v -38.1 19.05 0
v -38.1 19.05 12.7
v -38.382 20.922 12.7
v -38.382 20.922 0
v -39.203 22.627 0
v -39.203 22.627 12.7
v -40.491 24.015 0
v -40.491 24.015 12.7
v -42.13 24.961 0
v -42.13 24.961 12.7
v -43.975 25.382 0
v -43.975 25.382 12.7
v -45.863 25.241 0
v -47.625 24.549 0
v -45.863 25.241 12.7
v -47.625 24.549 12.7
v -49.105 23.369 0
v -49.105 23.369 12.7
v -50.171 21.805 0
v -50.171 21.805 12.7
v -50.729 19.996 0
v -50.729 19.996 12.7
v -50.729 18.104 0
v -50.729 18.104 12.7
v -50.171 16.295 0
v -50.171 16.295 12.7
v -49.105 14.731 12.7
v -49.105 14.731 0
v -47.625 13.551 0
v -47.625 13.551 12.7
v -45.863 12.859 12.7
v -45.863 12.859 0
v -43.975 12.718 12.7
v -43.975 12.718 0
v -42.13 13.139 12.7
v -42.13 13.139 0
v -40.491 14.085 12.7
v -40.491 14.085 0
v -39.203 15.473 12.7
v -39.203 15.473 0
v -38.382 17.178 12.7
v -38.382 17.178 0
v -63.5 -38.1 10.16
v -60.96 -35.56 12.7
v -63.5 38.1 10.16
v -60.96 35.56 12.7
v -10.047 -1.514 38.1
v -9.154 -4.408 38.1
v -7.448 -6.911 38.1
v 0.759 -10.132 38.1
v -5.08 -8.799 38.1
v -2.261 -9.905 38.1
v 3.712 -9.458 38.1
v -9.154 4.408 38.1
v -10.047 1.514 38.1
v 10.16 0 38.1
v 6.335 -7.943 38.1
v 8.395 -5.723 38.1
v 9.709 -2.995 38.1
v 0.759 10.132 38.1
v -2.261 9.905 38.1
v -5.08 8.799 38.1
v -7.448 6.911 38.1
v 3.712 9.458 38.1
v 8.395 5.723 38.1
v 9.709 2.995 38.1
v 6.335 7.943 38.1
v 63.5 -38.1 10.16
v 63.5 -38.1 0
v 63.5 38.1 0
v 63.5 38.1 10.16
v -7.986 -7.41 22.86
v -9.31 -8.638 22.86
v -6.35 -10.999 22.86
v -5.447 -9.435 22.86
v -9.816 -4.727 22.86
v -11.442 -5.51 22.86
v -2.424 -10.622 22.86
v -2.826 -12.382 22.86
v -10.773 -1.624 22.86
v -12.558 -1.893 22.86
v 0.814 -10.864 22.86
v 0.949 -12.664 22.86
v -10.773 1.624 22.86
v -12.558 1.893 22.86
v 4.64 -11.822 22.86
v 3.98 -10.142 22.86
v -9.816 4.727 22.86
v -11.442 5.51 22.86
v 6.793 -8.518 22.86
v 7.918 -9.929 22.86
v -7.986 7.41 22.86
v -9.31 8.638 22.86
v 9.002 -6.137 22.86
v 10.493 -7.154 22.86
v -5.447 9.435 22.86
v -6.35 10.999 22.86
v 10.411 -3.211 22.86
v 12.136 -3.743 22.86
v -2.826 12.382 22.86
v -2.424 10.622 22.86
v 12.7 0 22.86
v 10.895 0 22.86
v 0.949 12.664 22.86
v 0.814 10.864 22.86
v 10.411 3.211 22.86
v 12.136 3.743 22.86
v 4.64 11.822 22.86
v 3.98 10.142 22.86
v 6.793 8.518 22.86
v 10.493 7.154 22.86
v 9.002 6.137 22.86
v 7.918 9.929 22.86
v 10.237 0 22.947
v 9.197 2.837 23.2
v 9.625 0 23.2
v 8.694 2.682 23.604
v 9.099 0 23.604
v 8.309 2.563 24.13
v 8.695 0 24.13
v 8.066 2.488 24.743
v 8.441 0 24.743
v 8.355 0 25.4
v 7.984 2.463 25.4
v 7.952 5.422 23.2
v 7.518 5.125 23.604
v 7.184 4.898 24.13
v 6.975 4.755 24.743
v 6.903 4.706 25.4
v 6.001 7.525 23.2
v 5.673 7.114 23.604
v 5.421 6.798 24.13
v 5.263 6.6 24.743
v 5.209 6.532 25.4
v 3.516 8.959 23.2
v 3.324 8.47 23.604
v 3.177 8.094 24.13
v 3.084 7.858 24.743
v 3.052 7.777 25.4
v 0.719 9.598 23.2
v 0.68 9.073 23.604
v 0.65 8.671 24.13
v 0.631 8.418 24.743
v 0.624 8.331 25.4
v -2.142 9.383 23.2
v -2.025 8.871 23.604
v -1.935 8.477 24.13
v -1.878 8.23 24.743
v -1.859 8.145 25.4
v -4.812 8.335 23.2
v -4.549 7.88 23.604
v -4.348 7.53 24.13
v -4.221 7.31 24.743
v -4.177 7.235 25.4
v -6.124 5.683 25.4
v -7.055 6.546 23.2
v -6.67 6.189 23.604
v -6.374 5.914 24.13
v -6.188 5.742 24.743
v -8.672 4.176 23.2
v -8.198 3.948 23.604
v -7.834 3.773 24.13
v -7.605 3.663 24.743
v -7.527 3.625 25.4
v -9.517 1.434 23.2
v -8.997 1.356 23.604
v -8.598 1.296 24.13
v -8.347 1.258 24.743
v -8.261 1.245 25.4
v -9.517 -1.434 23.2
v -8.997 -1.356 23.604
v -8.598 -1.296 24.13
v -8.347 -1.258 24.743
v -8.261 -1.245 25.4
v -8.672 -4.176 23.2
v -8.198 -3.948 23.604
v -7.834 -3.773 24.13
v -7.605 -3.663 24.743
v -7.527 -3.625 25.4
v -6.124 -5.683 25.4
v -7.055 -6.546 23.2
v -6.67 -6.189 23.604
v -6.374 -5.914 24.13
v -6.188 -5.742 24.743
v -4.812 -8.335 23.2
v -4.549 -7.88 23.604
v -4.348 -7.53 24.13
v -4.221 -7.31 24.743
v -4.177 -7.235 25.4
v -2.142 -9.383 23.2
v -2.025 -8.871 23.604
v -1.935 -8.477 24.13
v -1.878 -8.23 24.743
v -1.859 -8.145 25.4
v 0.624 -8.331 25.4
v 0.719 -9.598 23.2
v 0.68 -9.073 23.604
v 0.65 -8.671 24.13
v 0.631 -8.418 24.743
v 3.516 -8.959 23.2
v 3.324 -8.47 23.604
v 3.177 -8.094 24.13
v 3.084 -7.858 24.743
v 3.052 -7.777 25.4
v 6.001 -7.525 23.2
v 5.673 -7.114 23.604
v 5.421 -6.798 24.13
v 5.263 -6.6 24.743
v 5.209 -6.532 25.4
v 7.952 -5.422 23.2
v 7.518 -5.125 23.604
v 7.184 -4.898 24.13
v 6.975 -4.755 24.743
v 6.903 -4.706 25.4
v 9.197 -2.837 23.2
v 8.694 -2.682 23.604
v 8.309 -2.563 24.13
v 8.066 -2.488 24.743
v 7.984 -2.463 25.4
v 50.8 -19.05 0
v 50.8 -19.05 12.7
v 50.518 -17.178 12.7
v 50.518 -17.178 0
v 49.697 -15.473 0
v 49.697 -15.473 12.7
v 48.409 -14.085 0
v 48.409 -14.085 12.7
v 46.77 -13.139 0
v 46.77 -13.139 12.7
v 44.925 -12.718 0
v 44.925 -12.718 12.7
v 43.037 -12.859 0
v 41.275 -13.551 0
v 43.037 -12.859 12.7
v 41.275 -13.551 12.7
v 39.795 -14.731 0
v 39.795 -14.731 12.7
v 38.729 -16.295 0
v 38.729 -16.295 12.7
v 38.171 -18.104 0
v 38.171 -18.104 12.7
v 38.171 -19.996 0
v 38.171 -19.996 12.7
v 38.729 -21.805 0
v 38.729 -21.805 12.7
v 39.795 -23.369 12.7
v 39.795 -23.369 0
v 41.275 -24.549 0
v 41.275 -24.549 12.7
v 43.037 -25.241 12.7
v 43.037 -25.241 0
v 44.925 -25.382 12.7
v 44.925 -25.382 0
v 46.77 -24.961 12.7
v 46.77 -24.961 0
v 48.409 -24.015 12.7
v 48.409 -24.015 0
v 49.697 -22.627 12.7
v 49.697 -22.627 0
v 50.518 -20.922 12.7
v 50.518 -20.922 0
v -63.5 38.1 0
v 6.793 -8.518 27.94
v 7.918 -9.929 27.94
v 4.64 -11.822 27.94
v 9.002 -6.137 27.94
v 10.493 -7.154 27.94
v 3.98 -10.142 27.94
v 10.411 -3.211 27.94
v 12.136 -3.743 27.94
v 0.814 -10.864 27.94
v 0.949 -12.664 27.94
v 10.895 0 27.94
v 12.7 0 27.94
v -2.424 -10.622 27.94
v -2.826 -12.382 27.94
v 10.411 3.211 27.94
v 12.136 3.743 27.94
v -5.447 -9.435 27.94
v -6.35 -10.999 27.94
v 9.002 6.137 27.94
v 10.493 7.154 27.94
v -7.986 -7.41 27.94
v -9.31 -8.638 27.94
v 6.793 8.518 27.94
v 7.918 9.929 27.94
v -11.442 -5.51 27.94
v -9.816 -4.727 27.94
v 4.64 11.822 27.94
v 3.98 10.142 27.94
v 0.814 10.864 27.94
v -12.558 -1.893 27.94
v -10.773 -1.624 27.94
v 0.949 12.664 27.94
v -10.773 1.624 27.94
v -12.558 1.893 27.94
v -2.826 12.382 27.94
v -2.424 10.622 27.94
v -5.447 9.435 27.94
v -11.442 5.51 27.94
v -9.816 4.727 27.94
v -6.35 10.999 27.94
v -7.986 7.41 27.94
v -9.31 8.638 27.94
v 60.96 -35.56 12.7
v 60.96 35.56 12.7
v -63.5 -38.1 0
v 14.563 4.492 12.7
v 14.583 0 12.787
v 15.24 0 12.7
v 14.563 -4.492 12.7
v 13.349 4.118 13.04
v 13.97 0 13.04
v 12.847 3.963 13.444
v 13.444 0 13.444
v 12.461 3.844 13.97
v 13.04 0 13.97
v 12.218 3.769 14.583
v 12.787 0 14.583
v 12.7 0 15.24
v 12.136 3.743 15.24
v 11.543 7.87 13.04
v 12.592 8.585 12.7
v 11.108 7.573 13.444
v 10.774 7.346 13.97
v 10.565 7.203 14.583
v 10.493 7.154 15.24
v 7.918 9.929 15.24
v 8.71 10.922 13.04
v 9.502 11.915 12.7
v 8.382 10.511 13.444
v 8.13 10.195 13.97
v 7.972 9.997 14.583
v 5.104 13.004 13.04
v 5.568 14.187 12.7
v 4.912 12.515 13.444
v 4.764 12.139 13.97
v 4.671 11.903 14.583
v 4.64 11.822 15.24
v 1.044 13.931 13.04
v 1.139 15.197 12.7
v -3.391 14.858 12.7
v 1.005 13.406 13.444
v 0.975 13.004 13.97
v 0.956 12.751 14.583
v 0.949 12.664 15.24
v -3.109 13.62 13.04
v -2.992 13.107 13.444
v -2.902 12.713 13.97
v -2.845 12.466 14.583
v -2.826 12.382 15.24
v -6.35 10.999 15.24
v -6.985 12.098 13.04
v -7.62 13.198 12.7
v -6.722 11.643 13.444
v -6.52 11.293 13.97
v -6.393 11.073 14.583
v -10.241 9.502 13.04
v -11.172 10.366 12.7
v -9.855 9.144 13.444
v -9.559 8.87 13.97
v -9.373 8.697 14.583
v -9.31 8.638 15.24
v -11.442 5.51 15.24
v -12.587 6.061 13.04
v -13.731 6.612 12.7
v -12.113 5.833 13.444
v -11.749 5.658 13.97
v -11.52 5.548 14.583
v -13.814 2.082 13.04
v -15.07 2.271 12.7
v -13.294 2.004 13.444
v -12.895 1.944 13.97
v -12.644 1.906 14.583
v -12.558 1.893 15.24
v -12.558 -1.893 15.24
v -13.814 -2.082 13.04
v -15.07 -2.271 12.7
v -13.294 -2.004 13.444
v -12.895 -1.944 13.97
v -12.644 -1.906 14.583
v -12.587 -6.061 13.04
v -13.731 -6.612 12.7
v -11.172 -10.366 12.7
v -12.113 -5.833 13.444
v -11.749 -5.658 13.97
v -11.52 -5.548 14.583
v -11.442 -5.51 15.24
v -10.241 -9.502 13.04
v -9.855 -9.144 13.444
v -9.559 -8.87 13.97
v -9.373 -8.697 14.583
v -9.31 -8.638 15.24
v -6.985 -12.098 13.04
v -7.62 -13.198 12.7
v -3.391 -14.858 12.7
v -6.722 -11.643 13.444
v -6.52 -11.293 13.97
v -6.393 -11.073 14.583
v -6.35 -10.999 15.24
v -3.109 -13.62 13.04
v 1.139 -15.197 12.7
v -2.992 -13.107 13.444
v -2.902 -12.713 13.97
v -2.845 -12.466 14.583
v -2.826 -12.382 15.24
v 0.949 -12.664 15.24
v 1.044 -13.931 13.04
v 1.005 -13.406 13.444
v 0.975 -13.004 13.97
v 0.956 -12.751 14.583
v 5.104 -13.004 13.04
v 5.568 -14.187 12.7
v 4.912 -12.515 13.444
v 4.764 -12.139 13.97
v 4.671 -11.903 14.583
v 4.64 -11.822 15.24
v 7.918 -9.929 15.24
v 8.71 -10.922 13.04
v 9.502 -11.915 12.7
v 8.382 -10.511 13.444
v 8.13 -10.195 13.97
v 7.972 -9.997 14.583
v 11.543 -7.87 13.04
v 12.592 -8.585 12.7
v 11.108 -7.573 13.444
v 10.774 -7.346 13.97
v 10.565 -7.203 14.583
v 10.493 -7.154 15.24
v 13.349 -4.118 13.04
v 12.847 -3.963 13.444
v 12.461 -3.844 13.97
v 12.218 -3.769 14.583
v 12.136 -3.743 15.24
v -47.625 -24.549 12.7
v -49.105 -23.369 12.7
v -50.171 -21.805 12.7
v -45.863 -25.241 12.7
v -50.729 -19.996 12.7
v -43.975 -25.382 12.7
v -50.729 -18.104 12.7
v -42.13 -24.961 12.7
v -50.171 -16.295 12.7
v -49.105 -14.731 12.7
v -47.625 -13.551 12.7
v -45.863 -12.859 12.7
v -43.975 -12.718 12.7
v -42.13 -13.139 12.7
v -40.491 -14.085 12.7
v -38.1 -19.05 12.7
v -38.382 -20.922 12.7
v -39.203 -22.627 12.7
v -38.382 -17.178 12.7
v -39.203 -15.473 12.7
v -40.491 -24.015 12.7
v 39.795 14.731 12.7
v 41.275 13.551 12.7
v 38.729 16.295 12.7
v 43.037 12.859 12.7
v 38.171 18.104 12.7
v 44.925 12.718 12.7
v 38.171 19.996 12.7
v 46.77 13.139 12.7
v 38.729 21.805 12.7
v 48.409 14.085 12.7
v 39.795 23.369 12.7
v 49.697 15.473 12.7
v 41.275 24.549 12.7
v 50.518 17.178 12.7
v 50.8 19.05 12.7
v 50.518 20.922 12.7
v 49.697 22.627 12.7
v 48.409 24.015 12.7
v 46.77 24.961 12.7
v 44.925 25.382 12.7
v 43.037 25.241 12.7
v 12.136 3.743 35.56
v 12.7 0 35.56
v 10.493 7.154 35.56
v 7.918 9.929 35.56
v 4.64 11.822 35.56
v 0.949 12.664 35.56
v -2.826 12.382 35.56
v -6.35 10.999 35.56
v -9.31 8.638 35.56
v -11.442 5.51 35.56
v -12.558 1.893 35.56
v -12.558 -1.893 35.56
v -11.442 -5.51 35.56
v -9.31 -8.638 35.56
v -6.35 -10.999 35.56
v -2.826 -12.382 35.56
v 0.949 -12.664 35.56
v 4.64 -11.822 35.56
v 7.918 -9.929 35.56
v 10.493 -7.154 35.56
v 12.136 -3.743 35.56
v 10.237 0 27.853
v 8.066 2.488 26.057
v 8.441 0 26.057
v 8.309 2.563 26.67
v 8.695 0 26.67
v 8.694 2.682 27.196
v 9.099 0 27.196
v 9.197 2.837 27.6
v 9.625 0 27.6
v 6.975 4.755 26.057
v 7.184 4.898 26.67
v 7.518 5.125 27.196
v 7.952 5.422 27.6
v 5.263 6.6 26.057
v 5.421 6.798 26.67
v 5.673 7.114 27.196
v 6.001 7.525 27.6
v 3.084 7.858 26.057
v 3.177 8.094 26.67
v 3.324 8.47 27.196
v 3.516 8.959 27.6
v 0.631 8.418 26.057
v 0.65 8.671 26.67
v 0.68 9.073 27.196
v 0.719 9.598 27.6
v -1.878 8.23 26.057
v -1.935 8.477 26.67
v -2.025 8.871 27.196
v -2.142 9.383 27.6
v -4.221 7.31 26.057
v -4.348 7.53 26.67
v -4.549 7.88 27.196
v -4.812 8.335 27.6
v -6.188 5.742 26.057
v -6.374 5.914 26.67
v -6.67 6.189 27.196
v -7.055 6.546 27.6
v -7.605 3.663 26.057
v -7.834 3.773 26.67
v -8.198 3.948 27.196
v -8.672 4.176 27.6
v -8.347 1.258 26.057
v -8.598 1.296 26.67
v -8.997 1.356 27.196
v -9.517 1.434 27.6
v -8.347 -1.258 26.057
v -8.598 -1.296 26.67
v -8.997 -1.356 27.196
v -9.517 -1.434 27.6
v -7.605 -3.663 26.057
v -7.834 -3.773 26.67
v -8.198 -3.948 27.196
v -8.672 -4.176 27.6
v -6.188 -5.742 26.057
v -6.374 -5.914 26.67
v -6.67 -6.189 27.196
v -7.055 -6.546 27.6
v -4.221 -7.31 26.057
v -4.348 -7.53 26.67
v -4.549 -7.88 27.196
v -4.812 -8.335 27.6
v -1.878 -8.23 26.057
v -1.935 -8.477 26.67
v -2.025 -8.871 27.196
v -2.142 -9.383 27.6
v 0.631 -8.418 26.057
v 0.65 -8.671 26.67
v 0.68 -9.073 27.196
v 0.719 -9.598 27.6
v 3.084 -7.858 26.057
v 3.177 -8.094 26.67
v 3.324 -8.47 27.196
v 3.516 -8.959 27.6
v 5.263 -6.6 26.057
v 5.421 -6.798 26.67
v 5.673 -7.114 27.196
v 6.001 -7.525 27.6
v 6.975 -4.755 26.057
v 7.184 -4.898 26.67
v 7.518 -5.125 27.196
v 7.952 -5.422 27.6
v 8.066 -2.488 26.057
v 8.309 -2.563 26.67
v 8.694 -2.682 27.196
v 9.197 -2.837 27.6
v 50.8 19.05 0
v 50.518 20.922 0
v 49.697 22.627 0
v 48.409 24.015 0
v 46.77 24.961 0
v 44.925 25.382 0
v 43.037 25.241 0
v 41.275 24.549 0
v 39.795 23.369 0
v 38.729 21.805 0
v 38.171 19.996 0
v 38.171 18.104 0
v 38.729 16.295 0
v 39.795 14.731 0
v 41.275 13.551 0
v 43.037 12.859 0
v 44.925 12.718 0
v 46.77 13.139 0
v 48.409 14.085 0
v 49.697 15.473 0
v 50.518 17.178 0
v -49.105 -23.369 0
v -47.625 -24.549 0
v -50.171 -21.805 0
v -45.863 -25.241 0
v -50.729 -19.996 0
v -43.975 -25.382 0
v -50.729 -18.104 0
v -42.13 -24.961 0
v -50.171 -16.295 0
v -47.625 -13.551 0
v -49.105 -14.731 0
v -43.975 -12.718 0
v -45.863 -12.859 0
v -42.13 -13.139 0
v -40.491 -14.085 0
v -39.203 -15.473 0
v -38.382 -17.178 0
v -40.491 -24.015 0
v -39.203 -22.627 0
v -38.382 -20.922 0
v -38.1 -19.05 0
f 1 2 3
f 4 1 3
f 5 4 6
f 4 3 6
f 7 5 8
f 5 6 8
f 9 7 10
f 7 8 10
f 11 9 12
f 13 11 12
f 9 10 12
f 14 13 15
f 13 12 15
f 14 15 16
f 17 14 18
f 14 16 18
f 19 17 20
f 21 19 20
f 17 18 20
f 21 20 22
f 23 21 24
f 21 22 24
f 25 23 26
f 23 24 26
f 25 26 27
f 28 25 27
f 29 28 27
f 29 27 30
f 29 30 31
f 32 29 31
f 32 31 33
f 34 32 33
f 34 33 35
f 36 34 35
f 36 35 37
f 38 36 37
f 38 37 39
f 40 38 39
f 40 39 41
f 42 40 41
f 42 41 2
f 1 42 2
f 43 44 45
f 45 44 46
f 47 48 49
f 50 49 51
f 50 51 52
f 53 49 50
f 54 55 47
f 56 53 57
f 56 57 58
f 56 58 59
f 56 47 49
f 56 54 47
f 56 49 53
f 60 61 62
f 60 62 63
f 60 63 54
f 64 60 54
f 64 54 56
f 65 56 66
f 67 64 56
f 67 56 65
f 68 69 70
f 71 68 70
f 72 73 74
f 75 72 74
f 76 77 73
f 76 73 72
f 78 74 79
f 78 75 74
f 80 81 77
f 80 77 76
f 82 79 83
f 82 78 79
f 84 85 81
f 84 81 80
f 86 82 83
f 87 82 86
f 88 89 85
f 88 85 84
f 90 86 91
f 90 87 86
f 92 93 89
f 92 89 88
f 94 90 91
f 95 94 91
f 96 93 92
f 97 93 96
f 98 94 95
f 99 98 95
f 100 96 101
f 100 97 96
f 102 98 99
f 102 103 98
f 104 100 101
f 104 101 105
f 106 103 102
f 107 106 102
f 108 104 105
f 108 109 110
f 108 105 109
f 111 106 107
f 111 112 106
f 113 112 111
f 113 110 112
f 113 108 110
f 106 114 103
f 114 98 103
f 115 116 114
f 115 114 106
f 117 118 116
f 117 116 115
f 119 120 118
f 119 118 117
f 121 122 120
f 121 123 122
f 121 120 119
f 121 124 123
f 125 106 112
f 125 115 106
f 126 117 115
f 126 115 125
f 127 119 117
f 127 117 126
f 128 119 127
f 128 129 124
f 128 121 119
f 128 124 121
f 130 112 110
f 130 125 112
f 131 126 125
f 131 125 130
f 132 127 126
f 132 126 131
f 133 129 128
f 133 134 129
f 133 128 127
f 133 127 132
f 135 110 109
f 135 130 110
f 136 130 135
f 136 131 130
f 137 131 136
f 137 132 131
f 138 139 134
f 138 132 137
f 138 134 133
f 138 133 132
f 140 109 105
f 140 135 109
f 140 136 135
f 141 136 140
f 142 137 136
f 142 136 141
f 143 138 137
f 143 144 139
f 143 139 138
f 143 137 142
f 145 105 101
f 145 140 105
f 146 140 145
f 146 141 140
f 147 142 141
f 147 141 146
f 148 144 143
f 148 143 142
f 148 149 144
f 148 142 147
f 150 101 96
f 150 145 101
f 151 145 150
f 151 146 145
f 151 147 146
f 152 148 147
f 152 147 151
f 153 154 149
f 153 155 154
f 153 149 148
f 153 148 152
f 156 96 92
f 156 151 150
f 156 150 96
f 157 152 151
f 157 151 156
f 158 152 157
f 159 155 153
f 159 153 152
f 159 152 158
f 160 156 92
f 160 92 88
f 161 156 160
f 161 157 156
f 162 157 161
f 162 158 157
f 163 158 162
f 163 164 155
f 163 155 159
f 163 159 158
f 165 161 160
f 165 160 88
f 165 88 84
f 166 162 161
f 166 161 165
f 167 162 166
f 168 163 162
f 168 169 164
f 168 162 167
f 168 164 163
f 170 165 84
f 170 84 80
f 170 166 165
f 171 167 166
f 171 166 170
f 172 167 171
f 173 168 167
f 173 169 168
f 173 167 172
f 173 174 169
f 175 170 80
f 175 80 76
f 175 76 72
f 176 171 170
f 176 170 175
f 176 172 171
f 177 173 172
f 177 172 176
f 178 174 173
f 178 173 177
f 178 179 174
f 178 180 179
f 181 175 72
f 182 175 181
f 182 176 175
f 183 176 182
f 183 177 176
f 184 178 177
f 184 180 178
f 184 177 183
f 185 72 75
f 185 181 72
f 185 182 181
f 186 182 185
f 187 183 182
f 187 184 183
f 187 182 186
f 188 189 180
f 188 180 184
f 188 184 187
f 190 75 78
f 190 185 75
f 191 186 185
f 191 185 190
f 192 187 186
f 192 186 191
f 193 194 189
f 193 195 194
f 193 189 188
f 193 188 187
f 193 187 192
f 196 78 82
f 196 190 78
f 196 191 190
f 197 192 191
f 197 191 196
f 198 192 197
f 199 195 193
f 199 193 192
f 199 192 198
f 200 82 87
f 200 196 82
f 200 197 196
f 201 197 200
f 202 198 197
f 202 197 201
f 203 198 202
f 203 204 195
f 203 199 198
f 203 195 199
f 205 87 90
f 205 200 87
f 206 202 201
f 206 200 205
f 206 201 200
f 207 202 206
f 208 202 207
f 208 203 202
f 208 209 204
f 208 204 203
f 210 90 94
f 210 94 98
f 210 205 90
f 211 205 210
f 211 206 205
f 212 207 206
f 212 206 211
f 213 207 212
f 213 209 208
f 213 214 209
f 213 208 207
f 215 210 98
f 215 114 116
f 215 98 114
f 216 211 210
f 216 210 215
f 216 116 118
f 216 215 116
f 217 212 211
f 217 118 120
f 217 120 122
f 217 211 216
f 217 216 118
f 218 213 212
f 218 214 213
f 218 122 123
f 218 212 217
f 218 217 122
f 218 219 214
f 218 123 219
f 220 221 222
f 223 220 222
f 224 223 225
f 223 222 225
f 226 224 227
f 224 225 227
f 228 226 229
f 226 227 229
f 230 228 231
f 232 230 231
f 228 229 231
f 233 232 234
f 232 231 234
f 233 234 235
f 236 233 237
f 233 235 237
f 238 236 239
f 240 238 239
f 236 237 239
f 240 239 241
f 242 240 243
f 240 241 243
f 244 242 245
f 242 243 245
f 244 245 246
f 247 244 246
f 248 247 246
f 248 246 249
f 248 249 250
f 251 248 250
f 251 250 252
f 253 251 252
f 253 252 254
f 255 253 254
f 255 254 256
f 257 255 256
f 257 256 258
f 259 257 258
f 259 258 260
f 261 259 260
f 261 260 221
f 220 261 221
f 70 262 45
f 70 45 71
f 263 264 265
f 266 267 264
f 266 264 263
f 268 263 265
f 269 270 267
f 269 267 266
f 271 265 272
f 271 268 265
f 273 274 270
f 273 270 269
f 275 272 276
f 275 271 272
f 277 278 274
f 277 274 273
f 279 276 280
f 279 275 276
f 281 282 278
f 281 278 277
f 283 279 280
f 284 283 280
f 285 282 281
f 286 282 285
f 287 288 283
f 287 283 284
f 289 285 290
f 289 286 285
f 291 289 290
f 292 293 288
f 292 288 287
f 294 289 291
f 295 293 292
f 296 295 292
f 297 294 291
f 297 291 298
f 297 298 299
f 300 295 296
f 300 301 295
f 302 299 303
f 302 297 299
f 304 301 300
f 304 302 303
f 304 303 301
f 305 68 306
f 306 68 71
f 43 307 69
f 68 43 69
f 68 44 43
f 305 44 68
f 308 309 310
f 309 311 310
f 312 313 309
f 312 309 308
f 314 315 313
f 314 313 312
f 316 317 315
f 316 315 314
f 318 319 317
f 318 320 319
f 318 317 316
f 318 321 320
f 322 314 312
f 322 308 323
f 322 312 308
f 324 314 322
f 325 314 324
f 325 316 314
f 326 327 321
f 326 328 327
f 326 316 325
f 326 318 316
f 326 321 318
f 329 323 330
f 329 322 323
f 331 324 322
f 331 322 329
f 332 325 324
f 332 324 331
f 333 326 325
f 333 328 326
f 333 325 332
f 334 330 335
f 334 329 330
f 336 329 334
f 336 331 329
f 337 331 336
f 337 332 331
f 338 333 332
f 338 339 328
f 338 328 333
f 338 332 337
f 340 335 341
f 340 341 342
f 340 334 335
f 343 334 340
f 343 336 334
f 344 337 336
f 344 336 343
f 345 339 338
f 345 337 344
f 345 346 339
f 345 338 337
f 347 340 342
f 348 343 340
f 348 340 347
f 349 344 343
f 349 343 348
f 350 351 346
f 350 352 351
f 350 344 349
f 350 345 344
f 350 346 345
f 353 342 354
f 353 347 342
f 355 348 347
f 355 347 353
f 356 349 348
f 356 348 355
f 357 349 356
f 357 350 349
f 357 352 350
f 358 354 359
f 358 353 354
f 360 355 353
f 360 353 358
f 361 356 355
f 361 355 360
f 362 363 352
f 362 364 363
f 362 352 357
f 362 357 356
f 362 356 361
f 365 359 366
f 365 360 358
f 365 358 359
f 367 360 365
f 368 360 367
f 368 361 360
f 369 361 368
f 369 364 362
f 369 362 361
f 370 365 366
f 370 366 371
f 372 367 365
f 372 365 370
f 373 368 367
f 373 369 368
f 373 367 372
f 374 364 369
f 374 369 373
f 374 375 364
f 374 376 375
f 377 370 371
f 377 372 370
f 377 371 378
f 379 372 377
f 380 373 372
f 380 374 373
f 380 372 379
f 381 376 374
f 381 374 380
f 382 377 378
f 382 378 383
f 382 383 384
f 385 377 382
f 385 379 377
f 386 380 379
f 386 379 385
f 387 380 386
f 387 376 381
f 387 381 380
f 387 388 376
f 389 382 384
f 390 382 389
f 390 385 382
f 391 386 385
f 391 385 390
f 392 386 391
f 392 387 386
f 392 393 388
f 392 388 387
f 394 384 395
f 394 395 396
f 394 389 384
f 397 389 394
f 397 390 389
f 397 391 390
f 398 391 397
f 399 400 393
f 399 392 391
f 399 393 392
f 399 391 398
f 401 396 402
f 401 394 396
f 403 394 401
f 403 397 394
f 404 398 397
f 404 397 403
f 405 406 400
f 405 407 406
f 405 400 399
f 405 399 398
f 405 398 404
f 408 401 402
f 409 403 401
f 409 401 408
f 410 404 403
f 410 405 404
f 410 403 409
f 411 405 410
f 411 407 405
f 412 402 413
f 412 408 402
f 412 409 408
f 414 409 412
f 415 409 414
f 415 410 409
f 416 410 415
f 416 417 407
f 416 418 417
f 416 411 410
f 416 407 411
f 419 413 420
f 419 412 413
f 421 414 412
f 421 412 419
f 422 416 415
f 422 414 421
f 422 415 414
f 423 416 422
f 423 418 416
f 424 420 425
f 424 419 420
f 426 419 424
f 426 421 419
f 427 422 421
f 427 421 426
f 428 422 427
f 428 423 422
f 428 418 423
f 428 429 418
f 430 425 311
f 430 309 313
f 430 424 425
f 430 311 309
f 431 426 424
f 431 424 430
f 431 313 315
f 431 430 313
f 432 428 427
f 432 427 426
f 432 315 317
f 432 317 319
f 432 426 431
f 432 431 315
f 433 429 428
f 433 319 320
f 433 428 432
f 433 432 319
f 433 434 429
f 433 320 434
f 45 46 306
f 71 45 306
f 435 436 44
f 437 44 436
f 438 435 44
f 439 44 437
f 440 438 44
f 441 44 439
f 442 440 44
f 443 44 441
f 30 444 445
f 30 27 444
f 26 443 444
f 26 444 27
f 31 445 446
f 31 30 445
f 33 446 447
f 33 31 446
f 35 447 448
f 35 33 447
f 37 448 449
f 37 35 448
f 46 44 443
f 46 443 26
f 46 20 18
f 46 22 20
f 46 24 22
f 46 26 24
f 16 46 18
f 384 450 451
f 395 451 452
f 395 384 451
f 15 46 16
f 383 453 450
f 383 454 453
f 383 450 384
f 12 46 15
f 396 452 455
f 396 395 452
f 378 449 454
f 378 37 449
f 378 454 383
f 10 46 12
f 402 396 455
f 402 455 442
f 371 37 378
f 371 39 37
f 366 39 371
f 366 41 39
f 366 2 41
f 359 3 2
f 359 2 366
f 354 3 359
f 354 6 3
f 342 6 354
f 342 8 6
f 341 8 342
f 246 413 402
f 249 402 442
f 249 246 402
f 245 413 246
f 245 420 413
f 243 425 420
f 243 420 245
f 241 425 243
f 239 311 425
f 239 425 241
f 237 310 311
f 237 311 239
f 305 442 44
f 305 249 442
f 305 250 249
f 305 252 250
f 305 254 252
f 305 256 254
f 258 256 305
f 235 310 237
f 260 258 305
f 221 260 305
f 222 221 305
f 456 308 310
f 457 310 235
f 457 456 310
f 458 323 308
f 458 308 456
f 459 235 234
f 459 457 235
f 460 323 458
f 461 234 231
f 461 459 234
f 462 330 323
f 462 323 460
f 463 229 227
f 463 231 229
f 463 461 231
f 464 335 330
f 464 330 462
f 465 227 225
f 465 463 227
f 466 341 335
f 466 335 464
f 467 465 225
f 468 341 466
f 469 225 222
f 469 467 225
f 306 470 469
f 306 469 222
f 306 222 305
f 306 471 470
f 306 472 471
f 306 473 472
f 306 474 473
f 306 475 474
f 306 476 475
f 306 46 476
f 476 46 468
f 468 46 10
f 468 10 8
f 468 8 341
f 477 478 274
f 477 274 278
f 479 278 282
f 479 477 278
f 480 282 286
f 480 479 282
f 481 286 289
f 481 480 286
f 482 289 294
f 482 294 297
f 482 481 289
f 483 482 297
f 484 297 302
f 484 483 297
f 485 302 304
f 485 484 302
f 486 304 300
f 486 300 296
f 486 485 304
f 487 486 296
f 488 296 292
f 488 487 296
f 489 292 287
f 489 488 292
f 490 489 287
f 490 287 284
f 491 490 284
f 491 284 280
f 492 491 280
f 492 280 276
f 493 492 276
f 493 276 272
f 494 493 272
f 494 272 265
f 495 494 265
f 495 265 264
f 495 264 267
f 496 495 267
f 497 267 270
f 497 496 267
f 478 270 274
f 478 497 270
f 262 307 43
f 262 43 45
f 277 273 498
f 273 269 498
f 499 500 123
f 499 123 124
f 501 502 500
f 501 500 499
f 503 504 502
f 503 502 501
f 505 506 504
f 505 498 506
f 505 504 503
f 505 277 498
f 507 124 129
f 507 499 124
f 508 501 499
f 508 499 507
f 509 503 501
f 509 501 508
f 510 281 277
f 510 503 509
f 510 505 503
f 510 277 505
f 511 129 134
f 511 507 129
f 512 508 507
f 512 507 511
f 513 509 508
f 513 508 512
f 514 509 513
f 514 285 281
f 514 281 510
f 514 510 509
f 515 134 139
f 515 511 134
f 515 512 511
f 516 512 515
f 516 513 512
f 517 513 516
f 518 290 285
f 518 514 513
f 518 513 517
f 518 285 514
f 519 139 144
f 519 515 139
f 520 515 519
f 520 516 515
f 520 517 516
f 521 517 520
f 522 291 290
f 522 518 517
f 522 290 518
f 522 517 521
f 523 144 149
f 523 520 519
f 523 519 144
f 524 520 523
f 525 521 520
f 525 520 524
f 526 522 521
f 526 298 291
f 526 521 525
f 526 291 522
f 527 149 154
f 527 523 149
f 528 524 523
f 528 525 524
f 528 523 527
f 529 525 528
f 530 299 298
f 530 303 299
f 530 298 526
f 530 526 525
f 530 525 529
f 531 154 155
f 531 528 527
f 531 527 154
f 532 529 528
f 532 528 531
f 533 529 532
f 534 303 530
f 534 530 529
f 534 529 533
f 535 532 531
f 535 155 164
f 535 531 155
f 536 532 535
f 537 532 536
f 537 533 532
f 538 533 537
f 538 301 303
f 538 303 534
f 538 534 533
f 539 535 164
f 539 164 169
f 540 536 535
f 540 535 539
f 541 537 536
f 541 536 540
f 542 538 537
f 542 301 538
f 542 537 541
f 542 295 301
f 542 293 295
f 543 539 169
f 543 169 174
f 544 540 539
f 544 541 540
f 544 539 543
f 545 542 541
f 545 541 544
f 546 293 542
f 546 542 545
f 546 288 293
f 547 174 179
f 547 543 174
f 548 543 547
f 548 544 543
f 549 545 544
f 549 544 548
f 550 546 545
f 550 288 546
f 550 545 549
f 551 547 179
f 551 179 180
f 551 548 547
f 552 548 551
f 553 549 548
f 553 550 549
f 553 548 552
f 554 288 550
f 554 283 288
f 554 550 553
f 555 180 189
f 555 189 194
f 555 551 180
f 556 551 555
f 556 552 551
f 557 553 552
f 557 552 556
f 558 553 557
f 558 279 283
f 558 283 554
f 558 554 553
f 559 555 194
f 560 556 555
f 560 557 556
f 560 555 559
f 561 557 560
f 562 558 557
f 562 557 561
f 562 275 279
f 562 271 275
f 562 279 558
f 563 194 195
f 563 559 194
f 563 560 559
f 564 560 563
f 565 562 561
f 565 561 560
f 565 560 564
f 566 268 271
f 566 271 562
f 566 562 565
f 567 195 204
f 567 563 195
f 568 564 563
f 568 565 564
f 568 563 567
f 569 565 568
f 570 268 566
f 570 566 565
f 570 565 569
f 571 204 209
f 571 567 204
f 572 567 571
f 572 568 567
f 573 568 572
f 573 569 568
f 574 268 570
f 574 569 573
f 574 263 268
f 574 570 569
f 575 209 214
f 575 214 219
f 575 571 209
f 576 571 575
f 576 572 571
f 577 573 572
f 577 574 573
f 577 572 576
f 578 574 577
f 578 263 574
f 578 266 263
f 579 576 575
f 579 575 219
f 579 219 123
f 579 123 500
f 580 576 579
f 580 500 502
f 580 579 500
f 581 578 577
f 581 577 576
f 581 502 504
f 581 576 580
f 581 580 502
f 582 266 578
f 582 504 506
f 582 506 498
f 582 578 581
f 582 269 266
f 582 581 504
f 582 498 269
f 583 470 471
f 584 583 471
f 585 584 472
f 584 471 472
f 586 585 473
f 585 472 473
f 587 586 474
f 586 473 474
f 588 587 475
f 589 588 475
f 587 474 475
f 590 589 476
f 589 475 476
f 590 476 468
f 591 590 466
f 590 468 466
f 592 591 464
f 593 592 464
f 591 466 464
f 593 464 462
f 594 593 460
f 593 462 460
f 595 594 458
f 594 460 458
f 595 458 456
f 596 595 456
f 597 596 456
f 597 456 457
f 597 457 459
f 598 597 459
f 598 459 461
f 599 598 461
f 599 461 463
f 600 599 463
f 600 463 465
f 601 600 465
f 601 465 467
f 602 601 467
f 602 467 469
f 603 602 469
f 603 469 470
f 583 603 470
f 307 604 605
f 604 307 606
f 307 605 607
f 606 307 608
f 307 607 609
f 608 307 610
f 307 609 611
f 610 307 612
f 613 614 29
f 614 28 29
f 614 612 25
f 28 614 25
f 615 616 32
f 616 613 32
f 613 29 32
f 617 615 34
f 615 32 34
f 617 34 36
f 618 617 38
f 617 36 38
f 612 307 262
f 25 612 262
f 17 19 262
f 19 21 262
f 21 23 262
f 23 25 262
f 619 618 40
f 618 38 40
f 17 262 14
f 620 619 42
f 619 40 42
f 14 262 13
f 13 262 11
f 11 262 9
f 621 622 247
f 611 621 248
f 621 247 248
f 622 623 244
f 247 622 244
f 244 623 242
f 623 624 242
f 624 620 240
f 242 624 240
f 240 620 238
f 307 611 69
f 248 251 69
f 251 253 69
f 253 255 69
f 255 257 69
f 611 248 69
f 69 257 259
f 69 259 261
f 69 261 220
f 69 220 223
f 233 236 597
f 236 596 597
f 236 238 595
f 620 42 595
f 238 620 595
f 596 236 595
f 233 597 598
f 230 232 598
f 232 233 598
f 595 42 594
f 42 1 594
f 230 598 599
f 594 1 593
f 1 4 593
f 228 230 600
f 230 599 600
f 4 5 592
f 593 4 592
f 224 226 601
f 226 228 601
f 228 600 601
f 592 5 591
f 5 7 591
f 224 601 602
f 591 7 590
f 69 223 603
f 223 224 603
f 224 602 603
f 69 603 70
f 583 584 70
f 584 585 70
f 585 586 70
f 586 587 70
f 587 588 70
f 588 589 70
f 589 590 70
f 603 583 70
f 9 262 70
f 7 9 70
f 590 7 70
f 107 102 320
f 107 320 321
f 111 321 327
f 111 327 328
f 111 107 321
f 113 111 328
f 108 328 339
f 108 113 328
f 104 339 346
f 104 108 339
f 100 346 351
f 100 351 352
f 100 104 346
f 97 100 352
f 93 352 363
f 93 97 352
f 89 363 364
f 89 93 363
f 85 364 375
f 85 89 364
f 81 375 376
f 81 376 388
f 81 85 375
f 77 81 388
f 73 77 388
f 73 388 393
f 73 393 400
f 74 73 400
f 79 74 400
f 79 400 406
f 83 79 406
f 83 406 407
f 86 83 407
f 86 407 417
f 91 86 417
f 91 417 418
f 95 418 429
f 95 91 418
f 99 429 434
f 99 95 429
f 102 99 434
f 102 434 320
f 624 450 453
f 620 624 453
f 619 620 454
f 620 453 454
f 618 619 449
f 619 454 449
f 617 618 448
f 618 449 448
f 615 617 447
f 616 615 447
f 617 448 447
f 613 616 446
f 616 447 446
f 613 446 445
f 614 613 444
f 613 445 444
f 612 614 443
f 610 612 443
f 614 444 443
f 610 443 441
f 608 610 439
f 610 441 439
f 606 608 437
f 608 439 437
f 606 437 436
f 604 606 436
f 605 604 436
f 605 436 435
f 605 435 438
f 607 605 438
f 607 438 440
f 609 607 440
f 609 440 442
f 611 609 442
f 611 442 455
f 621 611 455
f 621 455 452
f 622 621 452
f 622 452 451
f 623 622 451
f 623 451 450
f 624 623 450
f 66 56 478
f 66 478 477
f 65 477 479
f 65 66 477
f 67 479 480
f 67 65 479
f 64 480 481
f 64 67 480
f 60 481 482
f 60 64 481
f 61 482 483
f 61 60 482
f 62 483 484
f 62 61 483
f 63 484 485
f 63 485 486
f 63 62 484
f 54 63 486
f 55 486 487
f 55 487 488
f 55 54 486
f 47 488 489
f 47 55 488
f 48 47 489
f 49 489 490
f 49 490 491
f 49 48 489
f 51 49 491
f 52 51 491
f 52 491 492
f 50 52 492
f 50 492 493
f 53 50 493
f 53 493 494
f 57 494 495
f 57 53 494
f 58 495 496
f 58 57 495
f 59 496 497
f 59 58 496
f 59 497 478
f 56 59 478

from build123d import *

# Parameters (mm, degrees)
F0_W     = 127
F0_H     = 76.2
F1_DEPTH = 12.7
F2_R     = 6.35
F3_DEPTH = 12.701
F4_SIZE  = 2.54
F7_R     = 2.53999
F8_SIZE  = 2.54


# Not quite as in the source:
# - a fillet or chamfer is up to 0.001 mm smaller than in the source, because OpenCascade refuses the exact size


with BuildPart() as f1:
    # F0 (on Top) → F1 (new body)
    with BuildSketch(Plane.XY):
        Rectangle(F0_W, F0_H)
    extrude(amount=F1_DEPTH)

    # F2 (on face) → F3 (cut, through all)
    with BuildSketch(Plane.XY.offset(12.7)):
        with Locations((-44.45, 19.05)):
            Circle(F2_R)
        with Locations((44.45, 19.05)):
            Circle(F2_R)
        with Locations((44.45, -19.05)):
            Circle(F2_R)
        with Locations((-44.45, -19.05)):
            Circle(F2_R)
    extrude(amount=-F3_DEPTH, mode=Mode.SUBTRACT)

    # F4
    f4_edges = [f1.edges().sort_by_distance(p)[0] for p in [
        (-63.5, 0, 12.7),
        (0, 38.1, 12.7),
        (0, -38.1, 12.7),
        (63.5, 0, 12.7),
    ]]
    chamfer(f4_edges, length=F4_SIZE)

    # F5 (on Front) → F6 (revolve)
    with BuildSketch(Plane.XZ):
        Polygon((0, 38.1), (0, 12.7), (12.7, 12.7), (12.7, 22.86), (8.3547569811, 22.86), (8.3547569811, 27.94), (12.7, 27.94), (12.7, 38.1), align=None)
    revolve(axis=Axis((0, 0, 25.4), (0, 0, 1)))

    # F7 (radius 2.54 in the source; OpenCascade refuses exactly that, so slightly less here)
    f7_edges = [f1.edges().sort_by_distance(p)[0] for p in [
        (-12.7, 0, 12.7),
        (-8.354757, 0, 22.86),
        (-8.354757, 0, 27.94),
    ]]
    fillet(f7_edges, radius=F7_R)

    # F8
    f8_edges = [f1.edges().sort_by_distance(p)[0] for p in [
        (-12.7, 0, 38.1),
    ]]
    chamfer(f8_edges, length=F8_SIZE)


solid = f1.part
